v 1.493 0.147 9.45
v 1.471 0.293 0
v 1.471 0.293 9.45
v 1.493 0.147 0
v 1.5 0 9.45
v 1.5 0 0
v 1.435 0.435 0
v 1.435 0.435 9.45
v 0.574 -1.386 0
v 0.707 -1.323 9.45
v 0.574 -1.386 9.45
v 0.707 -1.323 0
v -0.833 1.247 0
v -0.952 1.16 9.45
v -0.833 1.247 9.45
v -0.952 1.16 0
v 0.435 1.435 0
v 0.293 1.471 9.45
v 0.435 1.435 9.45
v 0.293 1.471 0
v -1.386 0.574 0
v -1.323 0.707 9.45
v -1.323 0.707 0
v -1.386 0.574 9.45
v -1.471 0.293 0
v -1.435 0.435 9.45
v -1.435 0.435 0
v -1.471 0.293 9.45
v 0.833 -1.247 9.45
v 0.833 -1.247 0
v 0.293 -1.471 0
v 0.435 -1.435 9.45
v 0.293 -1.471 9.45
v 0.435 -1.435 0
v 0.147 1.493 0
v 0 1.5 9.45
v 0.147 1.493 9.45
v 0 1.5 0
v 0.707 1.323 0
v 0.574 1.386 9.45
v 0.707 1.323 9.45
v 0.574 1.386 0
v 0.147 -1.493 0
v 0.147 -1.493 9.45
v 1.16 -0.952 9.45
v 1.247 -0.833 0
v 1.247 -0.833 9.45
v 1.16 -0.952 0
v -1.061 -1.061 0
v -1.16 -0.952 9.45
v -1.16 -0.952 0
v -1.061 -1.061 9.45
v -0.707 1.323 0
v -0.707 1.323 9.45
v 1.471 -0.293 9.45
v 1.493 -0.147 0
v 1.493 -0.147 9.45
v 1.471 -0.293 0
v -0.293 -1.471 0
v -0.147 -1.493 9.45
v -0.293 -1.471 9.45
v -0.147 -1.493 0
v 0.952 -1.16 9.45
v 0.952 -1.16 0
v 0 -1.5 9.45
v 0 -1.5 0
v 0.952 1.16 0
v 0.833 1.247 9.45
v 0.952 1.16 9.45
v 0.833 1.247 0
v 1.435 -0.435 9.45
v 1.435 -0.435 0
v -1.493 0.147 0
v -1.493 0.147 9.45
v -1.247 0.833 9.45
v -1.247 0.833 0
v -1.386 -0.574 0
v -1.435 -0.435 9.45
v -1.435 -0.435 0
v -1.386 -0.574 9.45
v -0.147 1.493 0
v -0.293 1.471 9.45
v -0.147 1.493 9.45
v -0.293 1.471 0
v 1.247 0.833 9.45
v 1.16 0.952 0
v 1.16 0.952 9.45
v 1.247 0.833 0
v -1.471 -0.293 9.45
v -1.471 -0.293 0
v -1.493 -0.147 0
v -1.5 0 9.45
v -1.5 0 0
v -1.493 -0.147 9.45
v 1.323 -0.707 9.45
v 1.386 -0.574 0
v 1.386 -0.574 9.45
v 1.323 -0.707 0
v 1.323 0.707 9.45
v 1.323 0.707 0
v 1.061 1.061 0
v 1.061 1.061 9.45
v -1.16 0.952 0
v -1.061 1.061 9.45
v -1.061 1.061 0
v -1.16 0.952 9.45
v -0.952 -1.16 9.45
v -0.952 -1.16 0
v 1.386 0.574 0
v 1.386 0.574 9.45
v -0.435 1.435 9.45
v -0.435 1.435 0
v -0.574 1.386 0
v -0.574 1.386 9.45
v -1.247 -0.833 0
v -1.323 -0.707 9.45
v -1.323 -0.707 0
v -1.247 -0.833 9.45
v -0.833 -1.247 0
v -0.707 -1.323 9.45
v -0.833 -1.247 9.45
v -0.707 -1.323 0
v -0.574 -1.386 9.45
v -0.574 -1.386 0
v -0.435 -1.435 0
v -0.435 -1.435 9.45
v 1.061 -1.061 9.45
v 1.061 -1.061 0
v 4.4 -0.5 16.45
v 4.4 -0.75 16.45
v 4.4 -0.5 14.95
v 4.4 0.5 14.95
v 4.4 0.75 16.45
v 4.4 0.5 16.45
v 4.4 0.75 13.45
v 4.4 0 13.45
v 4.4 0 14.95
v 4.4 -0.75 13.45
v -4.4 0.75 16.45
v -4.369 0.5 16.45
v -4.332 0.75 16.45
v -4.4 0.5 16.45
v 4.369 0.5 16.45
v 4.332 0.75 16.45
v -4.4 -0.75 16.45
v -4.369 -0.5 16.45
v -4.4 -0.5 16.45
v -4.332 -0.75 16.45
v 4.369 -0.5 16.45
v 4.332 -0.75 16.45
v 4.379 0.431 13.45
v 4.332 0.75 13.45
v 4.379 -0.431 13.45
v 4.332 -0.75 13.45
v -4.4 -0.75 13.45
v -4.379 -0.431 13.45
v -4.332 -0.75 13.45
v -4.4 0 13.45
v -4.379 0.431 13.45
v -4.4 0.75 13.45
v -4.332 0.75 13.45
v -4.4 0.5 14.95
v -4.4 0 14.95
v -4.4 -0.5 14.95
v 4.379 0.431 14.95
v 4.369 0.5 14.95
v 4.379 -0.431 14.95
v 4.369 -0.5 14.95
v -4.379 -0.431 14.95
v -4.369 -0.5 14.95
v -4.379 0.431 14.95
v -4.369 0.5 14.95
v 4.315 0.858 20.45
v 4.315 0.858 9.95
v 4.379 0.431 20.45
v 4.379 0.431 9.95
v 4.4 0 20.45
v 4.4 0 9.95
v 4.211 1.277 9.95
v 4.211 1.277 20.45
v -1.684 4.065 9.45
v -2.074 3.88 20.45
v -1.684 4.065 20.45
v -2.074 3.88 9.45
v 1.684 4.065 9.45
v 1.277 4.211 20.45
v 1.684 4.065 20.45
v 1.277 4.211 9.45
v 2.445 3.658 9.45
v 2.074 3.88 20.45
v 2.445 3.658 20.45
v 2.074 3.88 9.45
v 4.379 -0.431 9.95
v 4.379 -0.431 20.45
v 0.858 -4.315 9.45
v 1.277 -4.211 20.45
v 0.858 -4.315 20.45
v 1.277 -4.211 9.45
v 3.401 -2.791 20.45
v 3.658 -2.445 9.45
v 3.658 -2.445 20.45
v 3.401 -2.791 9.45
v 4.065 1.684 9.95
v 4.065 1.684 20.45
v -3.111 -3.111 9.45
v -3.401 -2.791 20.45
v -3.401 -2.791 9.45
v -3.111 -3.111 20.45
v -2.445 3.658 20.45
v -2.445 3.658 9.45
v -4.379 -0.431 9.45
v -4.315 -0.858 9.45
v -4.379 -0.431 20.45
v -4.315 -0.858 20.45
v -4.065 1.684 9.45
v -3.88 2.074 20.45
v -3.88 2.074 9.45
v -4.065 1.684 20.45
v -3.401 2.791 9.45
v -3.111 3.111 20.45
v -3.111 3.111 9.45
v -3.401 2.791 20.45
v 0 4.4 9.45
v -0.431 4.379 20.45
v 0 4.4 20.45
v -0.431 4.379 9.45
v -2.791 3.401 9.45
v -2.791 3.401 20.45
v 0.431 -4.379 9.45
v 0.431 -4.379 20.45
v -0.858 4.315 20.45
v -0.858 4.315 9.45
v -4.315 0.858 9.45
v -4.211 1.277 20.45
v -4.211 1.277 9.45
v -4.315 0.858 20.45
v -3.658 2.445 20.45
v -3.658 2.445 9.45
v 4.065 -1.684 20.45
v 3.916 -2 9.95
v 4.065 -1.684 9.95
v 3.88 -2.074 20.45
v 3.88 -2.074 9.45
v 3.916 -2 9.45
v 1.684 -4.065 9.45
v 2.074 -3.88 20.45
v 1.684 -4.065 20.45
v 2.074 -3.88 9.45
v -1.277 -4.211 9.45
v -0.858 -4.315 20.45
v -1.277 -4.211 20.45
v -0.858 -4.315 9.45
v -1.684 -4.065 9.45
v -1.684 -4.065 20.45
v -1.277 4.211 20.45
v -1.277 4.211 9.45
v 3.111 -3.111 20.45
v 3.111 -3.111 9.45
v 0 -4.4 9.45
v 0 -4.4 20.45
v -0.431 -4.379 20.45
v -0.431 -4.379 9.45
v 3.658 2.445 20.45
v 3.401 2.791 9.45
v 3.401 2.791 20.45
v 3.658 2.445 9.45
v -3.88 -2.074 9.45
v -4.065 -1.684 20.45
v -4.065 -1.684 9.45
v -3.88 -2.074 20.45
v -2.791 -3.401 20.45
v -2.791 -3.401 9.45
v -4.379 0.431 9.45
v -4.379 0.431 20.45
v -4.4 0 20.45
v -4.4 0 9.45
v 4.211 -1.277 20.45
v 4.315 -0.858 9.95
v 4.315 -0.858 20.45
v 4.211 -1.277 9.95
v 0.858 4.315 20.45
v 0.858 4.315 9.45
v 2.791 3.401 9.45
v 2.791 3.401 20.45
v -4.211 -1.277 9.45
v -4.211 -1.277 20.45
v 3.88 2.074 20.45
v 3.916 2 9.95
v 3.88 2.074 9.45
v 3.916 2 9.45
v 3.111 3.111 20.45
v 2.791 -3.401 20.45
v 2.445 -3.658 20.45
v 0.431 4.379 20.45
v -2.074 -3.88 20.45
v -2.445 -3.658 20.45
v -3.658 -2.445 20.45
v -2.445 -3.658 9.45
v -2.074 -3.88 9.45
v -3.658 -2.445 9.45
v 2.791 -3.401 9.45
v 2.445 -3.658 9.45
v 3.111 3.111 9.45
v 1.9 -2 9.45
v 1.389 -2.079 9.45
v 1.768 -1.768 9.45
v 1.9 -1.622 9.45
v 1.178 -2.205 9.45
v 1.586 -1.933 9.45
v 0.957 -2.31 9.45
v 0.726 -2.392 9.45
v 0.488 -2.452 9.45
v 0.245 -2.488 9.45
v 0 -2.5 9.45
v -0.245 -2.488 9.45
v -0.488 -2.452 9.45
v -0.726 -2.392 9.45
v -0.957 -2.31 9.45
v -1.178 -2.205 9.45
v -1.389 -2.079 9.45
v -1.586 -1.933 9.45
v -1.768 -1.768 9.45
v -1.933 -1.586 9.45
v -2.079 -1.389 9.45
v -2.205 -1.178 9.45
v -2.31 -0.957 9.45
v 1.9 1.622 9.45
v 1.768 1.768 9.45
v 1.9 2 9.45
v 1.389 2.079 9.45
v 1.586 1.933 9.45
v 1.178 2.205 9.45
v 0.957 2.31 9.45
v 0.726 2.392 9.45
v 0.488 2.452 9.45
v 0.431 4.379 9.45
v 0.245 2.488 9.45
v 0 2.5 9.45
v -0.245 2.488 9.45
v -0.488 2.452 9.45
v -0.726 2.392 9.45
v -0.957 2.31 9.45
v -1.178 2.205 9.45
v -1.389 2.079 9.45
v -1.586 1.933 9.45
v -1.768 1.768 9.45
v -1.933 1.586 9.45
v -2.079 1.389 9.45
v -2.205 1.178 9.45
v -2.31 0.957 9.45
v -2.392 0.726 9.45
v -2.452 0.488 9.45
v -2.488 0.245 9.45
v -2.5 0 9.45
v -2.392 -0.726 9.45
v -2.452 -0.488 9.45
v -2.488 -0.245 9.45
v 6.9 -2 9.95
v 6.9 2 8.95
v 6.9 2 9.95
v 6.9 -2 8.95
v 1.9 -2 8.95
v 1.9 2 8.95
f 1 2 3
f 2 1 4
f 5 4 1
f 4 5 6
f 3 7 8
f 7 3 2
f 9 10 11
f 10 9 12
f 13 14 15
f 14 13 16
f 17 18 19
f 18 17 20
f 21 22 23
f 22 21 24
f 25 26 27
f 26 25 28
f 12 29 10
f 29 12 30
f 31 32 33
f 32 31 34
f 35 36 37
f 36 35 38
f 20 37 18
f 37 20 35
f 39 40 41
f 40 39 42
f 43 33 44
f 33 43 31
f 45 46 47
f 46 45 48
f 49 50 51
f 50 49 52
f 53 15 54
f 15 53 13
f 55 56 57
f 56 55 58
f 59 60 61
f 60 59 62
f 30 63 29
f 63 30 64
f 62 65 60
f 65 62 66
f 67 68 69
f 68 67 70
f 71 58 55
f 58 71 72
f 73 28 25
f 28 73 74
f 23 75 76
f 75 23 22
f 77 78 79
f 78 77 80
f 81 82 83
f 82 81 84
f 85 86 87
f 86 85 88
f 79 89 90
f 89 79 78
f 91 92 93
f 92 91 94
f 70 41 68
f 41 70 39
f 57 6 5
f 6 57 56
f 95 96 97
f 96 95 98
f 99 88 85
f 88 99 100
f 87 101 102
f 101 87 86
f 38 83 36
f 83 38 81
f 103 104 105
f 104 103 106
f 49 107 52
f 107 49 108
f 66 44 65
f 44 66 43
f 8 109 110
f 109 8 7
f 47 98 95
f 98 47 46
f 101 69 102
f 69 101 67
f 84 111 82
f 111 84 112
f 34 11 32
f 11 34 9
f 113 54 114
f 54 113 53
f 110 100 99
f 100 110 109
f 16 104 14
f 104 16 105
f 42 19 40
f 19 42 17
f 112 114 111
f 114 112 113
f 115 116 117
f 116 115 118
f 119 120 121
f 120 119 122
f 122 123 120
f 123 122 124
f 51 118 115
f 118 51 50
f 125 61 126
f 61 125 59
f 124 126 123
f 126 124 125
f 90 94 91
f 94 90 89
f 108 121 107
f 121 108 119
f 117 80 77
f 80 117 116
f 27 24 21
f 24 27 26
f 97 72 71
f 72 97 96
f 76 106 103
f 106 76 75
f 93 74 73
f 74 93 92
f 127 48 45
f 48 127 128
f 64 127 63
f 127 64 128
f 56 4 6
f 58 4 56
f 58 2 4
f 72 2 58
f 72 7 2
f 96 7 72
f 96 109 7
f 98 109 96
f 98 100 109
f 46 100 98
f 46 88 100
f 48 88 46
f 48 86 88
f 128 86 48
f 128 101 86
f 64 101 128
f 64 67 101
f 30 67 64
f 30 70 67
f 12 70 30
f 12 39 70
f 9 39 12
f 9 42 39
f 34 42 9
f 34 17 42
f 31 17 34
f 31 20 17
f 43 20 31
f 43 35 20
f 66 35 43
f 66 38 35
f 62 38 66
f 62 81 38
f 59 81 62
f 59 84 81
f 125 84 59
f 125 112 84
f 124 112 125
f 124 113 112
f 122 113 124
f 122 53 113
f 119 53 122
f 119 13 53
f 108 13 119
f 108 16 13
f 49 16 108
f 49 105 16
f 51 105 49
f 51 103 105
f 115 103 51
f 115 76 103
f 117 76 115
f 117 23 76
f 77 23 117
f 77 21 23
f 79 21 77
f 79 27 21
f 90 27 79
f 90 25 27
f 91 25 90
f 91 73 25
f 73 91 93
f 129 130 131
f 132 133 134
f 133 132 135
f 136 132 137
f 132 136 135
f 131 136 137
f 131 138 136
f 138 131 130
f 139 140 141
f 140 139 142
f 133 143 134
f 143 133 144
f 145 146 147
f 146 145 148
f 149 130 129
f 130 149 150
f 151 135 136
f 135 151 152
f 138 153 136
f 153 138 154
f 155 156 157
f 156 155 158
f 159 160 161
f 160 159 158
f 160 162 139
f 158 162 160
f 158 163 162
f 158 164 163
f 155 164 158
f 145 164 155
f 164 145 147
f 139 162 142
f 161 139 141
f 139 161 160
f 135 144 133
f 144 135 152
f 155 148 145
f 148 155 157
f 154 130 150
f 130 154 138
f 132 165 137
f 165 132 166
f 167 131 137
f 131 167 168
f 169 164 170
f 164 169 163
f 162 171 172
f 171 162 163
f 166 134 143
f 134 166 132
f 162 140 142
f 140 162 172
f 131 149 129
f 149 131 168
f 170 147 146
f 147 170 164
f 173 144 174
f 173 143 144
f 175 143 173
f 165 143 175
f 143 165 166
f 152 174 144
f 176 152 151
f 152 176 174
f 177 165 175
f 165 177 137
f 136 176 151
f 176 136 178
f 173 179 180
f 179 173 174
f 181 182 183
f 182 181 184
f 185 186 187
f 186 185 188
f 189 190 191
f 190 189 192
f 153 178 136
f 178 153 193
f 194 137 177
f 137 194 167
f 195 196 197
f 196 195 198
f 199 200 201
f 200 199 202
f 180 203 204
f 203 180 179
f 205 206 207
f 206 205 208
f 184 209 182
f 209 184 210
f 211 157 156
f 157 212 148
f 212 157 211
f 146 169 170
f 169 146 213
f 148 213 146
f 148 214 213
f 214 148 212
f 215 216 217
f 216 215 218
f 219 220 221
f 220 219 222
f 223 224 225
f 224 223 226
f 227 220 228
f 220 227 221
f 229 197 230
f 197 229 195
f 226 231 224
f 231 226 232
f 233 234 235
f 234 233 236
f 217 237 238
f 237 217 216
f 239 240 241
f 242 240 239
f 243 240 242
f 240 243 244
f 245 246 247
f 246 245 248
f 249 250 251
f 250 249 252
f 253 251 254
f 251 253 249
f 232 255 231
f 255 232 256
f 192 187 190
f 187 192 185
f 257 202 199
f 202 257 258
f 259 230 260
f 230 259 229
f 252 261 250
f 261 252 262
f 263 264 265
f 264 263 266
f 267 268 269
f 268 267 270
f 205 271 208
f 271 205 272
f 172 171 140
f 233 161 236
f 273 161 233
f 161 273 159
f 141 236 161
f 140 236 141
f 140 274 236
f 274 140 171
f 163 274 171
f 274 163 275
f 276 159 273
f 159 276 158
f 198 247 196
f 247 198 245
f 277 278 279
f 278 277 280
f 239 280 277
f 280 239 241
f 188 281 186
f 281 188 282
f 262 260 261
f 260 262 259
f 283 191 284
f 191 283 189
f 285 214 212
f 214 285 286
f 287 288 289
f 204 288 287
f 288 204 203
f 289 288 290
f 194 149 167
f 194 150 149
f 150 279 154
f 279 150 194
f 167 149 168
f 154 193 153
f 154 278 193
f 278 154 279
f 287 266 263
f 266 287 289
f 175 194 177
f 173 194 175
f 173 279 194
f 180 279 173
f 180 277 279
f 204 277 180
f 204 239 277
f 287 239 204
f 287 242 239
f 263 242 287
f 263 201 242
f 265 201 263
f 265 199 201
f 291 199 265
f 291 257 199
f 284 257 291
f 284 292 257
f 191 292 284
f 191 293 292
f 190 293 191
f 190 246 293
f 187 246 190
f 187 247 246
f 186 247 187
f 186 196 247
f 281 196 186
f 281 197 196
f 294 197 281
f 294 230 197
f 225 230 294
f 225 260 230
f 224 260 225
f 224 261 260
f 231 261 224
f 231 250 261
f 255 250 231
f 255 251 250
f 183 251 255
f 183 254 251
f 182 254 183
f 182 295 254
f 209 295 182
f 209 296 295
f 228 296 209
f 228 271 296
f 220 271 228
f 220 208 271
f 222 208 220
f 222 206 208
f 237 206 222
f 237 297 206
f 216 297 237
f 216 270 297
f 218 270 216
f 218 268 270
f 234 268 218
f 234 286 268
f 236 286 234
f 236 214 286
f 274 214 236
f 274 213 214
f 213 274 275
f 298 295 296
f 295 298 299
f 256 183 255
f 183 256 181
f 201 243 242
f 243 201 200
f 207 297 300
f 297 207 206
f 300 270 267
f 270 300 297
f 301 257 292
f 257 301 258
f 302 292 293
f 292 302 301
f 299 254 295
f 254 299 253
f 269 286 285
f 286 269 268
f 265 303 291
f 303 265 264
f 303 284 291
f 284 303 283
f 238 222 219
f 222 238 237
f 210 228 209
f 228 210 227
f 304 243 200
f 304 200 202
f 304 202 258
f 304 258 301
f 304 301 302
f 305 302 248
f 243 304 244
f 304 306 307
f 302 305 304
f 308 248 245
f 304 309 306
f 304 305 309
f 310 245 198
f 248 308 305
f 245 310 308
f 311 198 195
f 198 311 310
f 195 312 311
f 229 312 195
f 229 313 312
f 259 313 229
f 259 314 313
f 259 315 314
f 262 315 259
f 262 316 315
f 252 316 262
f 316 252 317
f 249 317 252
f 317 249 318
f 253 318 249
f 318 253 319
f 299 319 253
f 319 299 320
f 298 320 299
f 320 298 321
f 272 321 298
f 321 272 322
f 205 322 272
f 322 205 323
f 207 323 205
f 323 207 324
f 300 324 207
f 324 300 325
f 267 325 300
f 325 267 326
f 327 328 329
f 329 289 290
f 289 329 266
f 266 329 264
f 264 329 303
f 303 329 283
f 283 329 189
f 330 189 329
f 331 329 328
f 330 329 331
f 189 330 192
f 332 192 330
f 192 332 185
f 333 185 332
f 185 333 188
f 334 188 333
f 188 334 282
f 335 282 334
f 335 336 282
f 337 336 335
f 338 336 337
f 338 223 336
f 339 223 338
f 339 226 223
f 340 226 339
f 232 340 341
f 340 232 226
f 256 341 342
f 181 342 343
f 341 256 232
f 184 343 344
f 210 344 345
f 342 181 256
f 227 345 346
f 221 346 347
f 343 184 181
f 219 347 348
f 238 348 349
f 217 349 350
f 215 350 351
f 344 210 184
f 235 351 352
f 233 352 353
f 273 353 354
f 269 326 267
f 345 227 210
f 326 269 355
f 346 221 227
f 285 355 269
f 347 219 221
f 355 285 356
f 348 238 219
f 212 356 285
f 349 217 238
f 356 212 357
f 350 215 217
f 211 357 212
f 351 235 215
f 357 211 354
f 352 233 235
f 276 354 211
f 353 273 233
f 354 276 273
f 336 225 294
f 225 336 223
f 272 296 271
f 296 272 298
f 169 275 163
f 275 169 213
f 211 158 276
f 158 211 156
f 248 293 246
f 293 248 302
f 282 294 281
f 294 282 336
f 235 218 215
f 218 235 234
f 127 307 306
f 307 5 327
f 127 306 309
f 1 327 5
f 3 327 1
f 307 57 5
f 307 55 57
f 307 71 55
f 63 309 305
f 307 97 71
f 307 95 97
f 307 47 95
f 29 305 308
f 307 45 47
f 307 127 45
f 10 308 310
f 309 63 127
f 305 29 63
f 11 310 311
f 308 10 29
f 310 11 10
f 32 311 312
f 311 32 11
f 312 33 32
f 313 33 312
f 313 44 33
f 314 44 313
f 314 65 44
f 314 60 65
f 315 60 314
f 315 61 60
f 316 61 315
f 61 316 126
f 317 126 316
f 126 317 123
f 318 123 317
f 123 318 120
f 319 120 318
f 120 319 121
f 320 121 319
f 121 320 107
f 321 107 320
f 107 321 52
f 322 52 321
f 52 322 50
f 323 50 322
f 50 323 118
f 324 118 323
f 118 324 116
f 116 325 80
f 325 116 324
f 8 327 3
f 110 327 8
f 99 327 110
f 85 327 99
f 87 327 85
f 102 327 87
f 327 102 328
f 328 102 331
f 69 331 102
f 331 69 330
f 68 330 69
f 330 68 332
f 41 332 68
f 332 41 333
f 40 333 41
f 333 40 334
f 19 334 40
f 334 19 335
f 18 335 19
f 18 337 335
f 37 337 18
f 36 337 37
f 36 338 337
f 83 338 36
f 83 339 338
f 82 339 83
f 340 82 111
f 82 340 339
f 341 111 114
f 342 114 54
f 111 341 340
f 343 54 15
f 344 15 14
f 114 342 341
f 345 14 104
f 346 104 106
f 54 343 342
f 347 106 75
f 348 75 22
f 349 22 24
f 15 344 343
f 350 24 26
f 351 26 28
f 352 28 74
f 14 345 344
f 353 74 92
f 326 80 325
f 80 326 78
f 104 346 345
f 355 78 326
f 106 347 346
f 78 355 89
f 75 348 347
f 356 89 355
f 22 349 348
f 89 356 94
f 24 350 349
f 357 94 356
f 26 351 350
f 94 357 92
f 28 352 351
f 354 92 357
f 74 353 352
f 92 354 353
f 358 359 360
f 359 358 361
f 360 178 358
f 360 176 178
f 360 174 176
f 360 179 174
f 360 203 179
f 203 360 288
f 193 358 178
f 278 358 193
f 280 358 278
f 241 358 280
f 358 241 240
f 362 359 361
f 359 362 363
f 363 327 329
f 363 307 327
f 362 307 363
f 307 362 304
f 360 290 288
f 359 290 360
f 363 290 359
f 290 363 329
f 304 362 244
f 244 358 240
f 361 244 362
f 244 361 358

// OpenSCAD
module t_shaped_fastener() {
    // Parameters
    shank_length = 18.9;
    shank_diameter = 3.0;
    flare_diameter = 4.0;
    flare_height = 1.0;
    body_diameter = 8.8;
    body_length = 11.0;
    fork_width = 1.5;
    fork_gap = 1.0;
    fork_length = 3.0;
    boss_diameter = 5.0;
    boss_height = 1.0;
    tab_width = 4.0;
    tab_height = 1.0;
    tab_length = 5.0;
    
    // Shank with flared end
    difference() {
        union() {
            cylinder(h = shank_length, d = shank_diameter, $fn = 64);
            translate([0, 0, shank_length - flare_height])
                cylinder(h = flare_height, d1 = shank_diameter, d2 = flare_diameter, $fn = 64);
        }
        translate([0, 0, shank_length - fork_length])
            cube([shank_diameter, fork_gap, fork_length], center = true);
    }
    
    // Transverse body with fork
    translate([0, 0, shank_length / 2])
    union() {
        cylinder(h = body_length, d = body_diameter, $fn = 64);
        translate([0, 0, body_length / 2])
            difference() {
                cube([body_diameter, fork_width, fork_length], center = true);
                translate([0, 0, fork_length / 2])
                    cube([body_diameter, fork_gap, fork_length], center = true);
            }
    }
    
    // Boss at intersection
    translate([0, 0, shank_length / 2])
        cylinder(h = boss_height, d = boss_diameter, $fn = 64);
    
    // Wedge-like tab
    translate([body_diameter / 2, 0, shank_length / 2])
        cube([tab_length, tab_width, tab_height], center = true);
}

t_shaped_fastener();
